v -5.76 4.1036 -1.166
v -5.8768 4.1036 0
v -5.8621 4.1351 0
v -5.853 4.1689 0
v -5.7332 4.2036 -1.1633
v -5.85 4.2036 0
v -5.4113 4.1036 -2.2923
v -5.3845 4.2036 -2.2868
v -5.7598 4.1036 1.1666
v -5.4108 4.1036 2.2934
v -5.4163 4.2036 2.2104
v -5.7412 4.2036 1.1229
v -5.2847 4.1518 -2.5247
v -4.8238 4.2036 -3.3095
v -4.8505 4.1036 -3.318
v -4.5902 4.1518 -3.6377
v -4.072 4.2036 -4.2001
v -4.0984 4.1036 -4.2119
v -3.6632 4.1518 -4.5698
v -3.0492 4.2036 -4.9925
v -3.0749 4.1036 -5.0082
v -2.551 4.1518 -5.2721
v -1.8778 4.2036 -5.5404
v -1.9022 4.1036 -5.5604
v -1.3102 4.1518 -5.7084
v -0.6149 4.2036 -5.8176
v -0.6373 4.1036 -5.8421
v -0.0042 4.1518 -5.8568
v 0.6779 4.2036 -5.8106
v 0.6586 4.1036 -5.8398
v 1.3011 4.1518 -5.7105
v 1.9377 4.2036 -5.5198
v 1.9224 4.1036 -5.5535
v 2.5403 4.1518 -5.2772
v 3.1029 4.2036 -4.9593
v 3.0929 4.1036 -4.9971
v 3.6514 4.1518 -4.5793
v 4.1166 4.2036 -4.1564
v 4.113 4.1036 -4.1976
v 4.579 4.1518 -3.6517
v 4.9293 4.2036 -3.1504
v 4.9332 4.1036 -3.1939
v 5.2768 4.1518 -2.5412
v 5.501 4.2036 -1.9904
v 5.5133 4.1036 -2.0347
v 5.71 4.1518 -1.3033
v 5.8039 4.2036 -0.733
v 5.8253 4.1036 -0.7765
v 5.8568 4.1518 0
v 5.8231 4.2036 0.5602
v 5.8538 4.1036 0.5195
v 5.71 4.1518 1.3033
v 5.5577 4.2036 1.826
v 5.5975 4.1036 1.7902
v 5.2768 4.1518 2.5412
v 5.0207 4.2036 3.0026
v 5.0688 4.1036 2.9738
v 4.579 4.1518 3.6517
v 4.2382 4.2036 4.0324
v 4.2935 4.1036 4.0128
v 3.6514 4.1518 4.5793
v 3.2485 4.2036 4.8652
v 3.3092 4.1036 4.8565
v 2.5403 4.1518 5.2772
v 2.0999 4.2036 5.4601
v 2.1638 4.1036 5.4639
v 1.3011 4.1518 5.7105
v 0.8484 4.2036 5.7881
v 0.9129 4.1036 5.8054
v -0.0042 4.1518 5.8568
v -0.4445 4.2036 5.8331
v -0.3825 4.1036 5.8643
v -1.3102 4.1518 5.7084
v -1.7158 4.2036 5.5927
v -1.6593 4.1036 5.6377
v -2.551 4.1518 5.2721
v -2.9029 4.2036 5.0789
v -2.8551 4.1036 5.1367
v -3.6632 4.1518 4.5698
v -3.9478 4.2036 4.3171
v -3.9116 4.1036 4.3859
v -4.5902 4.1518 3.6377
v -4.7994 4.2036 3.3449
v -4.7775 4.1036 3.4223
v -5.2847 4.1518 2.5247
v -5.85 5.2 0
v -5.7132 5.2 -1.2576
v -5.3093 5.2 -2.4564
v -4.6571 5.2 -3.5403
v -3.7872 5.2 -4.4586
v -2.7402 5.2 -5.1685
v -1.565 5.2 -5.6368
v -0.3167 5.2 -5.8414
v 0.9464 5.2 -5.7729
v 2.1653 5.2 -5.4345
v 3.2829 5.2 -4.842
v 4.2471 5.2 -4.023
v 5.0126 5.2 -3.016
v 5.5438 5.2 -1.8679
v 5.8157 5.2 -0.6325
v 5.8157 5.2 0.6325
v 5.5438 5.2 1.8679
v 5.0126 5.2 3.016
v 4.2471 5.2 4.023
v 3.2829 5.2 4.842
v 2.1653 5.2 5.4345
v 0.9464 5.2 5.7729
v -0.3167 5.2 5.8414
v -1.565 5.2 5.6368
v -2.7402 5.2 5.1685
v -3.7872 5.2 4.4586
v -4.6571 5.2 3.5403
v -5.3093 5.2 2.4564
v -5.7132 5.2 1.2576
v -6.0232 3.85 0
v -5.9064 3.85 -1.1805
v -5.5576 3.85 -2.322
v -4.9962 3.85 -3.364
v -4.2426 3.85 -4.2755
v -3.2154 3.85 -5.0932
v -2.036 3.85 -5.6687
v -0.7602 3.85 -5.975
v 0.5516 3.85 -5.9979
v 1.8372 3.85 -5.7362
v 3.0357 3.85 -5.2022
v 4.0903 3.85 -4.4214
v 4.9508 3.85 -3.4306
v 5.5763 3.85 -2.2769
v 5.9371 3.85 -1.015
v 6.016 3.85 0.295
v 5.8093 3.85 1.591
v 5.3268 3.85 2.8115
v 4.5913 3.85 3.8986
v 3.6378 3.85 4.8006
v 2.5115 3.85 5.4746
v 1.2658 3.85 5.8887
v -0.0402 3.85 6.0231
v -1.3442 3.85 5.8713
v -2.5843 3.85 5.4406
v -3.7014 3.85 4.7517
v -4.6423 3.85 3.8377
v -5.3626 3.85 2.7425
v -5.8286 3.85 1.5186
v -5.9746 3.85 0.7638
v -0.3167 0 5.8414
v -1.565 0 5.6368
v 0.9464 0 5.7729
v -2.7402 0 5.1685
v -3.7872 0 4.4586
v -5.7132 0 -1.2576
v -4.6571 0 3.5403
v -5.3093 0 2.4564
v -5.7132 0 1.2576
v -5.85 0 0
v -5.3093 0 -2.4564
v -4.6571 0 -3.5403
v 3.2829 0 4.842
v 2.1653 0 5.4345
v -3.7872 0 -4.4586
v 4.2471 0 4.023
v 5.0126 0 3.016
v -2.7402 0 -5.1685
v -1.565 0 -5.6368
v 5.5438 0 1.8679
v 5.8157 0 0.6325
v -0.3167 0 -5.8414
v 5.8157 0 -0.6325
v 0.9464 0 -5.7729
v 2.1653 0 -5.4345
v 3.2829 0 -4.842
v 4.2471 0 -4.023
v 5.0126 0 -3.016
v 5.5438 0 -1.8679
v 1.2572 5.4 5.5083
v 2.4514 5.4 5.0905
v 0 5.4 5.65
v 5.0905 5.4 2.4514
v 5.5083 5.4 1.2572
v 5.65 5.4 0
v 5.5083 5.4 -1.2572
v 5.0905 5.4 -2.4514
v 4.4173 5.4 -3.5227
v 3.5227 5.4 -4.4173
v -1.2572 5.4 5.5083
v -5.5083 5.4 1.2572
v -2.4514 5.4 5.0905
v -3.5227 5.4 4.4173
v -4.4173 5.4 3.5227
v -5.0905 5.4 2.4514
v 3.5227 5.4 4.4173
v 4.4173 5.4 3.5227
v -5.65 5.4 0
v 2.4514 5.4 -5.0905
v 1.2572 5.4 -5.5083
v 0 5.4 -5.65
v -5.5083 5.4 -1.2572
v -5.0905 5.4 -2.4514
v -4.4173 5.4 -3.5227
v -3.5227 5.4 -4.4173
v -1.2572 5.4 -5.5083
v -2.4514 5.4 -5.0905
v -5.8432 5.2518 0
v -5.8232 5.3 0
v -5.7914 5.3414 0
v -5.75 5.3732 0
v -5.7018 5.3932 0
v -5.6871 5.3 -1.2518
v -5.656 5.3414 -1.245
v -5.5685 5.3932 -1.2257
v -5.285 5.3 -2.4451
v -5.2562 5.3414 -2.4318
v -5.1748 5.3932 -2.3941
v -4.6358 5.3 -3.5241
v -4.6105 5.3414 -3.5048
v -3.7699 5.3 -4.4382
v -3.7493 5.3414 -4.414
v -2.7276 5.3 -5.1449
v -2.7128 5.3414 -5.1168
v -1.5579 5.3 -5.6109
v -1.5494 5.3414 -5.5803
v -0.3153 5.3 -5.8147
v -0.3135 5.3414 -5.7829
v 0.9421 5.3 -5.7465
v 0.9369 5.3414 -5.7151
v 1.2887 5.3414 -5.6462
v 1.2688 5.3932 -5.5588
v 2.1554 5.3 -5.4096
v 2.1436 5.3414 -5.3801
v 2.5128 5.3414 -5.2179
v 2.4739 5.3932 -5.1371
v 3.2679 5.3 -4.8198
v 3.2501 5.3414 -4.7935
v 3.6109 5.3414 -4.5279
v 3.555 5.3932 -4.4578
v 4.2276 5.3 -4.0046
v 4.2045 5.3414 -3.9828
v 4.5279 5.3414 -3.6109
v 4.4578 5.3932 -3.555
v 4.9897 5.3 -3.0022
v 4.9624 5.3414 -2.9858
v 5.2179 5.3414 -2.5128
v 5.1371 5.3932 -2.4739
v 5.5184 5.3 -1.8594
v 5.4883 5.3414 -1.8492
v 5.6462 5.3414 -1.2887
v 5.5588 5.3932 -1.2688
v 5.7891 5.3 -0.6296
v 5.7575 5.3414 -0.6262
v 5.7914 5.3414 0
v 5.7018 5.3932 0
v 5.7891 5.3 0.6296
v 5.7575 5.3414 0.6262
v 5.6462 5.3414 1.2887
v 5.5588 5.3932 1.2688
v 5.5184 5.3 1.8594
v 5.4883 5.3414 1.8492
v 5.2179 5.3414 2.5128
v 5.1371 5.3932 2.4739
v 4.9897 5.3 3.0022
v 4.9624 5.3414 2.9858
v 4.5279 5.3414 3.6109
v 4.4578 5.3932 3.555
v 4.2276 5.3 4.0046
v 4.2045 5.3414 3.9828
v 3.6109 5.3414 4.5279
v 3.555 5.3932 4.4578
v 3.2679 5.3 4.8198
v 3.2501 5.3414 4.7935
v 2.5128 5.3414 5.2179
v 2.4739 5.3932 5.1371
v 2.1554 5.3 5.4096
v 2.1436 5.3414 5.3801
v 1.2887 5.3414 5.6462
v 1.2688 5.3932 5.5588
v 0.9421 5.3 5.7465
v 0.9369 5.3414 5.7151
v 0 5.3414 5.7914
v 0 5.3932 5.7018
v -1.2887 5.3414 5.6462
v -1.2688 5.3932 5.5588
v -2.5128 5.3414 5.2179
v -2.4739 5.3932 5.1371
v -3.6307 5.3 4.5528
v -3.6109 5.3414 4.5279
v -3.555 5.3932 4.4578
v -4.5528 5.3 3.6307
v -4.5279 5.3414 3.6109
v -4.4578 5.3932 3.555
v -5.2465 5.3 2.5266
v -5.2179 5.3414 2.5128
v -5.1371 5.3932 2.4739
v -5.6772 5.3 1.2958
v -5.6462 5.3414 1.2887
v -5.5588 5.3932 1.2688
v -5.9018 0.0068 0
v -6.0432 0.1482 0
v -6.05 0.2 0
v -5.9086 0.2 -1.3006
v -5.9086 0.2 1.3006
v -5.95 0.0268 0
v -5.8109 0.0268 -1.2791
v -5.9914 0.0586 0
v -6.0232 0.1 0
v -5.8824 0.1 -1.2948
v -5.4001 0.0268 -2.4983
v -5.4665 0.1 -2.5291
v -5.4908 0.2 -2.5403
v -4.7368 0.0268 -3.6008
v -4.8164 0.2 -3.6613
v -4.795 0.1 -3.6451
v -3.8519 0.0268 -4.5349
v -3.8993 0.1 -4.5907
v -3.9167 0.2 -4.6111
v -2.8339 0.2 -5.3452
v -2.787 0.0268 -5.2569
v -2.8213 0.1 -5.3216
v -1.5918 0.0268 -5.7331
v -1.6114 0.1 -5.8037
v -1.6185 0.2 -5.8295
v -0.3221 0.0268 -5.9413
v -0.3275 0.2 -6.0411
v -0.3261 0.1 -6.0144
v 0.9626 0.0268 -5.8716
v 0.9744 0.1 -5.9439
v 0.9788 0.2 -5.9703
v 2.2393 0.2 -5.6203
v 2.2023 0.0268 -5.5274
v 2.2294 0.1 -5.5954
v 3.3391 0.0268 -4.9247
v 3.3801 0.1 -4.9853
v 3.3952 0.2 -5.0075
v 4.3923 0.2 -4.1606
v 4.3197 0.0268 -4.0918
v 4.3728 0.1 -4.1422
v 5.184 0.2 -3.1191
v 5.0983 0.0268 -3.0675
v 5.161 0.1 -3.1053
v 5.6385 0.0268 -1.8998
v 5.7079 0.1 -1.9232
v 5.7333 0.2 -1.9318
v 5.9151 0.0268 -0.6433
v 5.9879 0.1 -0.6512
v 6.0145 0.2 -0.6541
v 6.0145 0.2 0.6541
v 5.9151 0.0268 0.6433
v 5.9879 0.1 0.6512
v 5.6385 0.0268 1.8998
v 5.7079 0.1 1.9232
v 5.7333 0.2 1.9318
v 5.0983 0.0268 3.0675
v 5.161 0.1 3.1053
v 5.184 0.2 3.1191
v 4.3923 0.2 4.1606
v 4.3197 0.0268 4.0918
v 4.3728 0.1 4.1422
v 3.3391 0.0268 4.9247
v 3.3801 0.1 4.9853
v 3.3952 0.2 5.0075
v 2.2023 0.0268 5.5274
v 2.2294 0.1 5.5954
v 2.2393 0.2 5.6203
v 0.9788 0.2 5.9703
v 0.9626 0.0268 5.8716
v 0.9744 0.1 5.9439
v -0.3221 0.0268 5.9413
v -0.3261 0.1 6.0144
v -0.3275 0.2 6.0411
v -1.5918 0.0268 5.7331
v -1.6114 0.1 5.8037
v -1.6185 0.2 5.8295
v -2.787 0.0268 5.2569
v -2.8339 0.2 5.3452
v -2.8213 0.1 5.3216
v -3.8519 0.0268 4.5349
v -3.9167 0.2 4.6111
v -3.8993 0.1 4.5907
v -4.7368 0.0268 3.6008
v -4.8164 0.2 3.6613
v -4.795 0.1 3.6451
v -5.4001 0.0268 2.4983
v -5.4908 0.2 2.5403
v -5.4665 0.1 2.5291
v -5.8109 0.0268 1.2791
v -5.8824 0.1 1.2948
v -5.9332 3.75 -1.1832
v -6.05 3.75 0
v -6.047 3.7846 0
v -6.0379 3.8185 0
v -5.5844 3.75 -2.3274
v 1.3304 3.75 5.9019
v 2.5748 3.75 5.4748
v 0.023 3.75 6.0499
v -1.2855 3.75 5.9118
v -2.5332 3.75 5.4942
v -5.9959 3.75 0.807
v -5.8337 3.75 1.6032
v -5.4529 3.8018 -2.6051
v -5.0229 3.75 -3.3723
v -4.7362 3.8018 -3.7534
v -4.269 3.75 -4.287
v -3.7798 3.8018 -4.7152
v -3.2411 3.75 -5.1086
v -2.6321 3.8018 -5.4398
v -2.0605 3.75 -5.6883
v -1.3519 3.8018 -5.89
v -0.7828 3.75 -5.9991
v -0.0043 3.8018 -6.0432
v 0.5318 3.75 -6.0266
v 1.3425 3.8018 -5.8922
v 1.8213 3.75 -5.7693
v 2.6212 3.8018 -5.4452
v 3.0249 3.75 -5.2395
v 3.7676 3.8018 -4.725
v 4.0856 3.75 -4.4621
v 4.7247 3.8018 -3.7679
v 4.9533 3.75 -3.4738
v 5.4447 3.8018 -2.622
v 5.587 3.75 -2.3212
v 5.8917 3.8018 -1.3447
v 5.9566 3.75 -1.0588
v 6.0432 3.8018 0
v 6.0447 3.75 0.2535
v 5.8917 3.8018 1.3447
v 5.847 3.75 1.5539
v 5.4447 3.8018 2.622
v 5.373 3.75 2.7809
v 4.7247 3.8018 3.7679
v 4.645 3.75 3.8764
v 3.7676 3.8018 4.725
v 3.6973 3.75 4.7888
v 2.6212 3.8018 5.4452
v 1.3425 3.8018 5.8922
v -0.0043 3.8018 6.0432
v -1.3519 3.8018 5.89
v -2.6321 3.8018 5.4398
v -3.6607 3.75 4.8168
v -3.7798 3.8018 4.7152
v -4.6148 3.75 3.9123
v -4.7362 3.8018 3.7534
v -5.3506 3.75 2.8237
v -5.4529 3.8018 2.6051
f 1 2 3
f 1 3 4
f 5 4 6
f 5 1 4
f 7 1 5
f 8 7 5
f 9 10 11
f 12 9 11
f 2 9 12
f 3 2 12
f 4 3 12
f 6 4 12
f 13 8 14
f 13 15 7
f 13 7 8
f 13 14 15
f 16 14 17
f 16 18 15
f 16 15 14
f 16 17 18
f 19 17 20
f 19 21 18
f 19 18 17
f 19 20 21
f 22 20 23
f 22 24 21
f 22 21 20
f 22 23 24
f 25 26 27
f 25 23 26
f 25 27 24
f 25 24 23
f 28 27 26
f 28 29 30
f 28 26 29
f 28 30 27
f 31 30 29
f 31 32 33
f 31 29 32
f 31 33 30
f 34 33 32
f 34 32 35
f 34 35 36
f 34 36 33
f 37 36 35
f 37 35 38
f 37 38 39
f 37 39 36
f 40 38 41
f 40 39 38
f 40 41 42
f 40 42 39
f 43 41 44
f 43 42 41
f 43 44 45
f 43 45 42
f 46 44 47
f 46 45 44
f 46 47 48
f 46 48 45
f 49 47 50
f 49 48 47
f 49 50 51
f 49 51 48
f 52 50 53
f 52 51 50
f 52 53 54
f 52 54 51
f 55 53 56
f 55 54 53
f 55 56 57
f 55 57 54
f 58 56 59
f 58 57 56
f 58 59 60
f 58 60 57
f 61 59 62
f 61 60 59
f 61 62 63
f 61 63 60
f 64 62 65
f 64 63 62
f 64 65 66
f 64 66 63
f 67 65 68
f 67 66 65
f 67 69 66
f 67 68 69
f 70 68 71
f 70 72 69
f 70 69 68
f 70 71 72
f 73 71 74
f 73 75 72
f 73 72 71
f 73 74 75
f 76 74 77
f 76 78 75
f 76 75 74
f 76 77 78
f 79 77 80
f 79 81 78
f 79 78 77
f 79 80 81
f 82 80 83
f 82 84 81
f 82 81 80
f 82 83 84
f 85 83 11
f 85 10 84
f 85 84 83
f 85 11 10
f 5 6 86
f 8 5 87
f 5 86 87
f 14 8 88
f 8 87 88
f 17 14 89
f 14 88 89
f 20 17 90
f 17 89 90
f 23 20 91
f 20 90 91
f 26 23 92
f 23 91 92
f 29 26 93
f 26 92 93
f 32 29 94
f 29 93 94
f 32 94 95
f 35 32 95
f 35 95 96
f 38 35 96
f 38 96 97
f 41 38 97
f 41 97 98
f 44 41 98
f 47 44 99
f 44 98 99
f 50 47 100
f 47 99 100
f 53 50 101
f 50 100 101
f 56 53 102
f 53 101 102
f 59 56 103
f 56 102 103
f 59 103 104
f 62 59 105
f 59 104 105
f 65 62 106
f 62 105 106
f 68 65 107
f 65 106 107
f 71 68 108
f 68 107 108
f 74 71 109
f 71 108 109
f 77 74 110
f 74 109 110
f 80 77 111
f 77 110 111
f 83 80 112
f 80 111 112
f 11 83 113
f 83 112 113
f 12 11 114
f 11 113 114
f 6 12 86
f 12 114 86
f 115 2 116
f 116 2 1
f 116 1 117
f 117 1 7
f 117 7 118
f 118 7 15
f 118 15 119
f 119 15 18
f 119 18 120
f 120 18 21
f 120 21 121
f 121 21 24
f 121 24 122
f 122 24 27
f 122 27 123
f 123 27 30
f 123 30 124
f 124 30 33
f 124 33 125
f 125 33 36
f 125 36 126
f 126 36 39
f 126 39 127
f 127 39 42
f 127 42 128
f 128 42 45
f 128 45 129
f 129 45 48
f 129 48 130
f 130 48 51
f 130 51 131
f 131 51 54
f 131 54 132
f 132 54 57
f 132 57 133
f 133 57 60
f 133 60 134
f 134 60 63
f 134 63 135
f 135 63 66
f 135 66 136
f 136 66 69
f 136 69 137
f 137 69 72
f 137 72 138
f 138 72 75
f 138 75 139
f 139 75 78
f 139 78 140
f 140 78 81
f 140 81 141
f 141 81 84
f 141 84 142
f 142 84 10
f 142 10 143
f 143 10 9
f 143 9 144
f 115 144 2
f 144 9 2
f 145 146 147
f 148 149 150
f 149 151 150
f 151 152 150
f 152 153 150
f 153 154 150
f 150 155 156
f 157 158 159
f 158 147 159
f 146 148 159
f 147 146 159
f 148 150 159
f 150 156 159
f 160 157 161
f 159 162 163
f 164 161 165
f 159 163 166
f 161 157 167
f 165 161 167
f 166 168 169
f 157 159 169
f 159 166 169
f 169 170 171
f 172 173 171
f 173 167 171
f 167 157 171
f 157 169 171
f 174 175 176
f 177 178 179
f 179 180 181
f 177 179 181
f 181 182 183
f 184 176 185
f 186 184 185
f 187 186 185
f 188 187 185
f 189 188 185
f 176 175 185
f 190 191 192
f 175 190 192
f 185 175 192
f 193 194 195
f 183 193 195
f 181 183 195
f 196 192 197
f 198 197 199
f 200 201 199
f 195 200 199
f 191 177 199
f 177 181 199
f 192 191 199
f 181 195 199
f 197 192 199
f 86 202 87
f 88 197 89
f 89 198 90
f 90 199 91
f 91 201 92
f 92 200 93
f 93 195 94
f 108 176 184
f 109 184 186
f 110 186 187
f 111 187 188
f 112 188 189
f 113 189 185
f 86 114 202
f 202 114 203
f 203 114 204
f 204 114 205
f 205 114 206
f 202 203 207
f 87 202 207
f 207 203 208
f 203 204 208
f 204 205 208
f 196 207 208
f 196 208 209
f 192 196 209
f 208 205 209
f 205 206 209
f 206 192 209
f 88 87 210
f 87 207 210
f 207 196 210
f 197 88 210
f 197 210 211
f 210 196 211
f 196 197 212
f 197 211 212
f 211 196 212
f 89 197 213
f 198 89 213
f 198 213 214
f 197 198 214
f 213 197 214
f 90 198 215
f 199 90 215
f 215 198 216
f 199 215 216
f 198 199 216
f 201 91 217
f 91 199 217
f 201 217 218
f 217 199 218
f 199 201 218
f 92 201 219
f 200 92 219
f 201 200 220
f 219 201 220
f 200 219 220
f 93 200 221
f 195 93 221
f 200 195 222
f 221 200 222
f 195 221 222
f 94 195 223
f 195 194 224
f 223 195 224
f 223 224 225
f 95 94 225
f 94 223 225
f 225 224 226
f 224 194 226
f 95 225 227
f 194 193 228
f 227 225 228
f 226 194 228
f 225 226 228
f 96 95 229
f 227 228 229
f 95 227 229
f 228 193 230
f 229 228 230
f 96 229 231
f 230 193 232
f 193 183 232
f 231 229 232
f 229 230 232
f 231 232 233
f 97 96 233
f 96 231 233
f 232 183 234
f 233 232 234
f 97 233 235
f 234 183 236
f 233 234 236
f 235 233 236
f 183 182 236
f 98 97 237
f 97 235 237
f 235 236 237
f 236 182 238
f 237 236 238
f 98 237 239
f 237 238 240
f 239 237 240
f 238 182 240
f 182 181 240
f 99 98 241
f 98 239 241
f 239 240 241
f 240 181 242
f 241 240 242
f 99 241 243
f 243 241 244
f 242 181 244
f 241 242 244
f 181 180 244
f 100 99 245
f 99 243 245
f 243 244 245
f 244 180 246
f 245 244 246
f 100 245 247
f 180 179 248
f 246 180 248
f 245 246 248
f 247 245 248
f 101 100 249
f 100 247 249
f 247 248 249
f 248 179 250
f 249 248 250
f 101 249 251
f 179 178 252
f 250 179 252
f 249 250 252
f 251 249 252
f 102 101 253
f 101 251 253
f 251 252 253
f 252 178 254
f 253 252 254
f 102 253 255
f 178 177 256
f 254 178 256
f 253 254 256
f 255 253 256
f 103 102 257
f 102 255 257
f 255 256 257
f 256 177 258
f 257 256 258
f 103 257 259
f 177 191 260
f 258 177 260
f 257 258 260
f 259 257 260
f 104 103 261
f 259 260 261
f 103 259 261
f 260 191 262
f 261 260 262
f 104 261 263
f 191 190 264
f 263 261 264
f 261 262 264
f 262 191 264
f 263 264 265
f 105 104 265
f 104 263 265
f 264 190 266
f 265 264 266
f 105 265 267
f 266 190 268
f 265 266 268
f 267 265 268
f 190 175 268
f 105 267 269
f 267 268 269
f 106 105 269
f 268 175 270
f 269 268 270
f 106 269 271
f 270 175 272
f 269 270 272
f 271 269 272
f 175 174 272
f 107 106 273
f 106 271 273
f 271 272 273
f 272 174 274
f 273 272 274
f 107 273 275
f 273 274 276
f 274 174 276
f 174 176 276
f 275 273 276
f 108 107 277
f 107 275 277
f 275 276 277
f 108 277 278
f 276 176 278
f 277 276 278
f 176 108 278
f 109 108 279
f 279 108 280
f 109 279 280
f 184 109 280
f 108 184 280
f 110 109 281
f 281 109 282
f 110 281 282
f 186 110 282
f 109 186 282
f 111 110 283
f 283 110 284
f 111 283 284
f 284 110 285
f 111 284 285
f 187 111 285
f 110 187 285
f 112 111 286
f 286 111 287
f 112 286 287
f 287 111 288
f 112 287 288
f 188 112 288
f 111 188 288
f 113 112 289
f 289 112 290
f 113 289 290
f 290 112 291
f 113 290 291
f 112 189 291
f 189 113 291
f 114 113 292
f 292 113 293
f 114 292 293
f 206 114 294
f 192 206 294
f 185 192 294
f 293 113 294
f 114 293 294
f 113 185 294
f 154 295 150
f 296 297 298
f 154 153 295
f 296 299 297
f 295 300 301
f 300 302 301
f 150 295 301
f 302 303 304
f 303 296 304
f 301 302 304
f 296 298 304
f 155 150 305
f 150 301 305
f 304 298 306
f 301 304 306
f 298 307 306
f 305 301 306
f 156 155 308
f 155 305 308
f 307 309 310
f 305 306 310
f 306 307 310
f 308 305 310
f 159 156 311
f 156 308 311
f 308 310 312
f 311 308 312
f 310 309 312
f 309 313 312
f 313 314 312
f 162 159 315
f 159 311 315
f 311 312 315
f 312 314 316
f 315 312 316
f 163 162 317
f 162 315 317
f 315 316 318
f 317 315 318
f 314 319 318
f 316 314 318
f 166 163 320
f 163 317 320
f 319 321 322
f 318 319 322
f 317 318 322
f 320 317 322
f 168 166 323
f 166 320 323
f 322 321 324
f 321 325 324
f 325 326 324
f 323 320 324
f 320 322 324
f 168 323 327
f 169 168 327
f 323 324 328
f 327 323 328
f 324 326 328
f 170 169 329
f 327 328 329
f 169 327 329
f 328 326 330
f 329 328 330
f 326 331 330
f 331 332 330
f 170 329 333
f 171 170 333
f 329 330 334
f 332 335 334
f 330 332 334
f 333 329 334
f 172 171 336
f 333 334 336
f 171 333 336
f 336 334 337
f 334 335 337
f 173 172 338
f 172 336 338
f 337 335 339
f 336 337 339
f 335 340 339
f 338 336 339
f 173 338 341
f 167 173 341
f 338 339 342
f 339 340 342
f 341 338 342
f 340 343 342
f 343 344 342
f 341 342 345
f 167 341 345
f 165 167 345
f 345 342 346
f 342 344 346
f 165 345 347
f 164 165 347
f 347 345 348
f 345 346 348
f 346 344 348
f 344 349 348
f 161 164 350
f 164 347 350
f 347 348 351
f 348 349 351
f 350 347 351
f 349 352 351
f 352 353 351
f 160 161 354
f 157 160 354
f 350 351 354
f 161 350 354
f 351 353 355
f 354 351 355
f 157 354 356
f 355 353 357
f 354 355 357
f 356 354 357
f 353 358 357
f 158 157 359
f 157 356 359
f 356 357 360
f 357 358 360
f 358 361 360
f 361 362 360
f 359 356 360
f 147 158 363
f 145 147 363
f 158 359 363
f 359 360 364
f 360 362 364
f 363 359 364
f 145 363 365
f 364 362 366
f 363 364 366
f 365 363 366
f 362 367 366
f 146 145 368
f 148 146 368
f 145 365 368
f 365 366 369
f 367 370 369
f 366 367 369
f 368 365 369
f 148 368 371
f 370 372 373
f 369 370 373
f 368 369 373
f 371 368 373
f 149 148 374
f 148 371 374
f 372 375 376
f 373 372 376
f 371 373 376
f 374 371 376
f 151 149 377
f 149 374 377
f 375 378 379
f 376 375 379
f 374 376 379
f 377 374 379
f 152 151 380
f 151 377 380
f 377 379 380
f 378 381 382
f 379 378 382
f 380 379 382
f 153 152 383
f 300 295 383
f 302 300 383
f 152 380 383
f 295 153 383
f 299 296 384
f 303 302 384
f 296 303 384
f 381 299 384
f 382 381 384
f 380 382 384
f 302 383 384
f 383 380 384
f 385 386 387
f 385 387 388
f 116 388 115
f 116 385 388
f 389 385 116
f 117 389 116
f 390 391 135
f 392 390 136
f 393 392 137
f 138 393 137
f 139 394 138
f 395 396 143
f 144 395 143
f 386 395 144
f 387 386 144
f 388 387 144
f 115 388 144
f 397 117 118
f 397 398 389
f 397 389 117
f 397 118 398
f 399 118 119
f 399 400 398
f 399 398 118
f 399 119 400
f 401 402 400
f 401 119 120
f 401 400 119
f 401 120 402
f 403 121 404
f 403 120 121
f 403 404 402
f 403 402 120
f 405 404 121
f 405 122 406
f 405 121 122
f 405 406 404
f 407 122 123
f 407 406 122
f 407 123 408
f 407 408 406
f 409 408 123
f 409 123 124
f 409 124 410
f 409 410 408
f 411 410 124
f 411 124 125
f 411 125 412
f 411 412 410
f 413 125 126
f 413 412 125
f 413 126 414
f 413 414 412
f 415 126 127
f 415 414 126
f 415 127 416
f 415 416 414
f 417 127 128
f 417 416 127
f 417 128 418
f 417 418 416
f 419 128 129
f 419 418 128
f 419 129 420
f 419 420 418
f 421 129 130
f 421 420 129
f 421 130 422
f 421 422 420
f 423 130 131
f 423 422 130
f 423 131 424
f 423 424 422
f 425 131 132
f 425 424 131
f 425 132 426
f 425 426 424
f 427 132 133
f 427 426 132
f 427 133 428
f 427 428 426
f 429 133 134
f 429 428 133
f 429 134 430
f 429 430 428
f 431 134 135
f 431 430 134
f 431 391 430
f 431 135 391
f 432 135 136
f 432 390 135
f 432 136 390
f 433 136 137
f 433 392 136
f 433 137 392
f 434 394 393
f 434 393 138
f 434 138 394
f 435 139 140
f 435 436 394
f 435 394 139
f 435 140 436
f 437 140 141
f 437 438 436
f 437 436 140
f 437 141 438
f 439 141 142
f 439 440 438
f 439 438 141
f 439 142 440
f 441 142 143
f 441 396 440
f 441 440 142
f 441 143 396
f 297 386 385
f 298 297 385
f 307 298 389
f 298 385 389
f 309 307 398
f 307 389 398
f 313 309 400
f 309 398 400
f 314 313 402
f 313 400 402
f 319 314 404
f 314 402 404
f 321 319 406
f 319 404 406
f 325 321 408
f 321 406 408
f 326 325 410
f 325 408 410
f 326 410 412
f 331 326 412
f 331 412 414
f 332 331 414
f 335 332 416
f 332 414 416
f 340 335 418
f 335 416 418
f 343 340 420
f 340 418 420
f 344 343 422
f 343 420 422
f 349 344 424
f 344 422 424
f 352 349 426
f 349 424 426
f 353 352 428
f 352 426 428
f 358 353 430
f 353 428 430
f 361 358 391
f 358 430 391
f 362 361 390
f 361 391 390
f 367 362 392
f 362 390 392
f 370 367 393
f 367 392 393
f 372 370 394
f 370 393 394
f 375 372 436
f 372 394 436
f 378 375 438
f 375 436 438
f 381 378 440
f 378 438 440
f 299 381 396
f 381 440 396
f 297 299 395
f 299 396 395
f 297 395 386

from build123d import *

# Parameters (mm, degrees)
FILLET1_R = 0.2
FILLET2_R = 0.2


with BuildPart() as part:
    # Sketch1 → Revolve1 (revolve)
    with BuildSketch(Plane.XY):
        with BuildLine():
            Line((0, 0), (-6.05, 0))
            Line((-6.05, 0), (-6.05, 3.803589838))
            Line((-6.05, 3.803589838), (-5.85, 4.15))
            Line((-5.85, 4.15), (-5.85, 5.2))
            ThreePointArc((-5.85, 5.2), (-5.791421356, 5.341421356), (-5.65, 5.4))
            Line((-5.65, 5.4), (0, 5.4))
            Line((0, 5.4), (0, 0))
        make_face()
    revolve(axis=Axis((0, 5.4, 0), (0, -1, 0)))

    # Fillet1
    fillet1_edges = [part.edges().sort_by_distance(p)[0] for p in [
        (6.05, 0, 0),
    ]]
    fillet(fillet1_edges, radius=FILLET1_R)

    # Fillet2
    fillet2_edges = [part.edges().sort_by_distance(p)[0] for p in [
        (5.85, 4.15, 0),
        (6.05, 3.803589838, 0),
    ]]
    fillet(fillet2_edges, radius=FILLET2_R)


solid = part.part
